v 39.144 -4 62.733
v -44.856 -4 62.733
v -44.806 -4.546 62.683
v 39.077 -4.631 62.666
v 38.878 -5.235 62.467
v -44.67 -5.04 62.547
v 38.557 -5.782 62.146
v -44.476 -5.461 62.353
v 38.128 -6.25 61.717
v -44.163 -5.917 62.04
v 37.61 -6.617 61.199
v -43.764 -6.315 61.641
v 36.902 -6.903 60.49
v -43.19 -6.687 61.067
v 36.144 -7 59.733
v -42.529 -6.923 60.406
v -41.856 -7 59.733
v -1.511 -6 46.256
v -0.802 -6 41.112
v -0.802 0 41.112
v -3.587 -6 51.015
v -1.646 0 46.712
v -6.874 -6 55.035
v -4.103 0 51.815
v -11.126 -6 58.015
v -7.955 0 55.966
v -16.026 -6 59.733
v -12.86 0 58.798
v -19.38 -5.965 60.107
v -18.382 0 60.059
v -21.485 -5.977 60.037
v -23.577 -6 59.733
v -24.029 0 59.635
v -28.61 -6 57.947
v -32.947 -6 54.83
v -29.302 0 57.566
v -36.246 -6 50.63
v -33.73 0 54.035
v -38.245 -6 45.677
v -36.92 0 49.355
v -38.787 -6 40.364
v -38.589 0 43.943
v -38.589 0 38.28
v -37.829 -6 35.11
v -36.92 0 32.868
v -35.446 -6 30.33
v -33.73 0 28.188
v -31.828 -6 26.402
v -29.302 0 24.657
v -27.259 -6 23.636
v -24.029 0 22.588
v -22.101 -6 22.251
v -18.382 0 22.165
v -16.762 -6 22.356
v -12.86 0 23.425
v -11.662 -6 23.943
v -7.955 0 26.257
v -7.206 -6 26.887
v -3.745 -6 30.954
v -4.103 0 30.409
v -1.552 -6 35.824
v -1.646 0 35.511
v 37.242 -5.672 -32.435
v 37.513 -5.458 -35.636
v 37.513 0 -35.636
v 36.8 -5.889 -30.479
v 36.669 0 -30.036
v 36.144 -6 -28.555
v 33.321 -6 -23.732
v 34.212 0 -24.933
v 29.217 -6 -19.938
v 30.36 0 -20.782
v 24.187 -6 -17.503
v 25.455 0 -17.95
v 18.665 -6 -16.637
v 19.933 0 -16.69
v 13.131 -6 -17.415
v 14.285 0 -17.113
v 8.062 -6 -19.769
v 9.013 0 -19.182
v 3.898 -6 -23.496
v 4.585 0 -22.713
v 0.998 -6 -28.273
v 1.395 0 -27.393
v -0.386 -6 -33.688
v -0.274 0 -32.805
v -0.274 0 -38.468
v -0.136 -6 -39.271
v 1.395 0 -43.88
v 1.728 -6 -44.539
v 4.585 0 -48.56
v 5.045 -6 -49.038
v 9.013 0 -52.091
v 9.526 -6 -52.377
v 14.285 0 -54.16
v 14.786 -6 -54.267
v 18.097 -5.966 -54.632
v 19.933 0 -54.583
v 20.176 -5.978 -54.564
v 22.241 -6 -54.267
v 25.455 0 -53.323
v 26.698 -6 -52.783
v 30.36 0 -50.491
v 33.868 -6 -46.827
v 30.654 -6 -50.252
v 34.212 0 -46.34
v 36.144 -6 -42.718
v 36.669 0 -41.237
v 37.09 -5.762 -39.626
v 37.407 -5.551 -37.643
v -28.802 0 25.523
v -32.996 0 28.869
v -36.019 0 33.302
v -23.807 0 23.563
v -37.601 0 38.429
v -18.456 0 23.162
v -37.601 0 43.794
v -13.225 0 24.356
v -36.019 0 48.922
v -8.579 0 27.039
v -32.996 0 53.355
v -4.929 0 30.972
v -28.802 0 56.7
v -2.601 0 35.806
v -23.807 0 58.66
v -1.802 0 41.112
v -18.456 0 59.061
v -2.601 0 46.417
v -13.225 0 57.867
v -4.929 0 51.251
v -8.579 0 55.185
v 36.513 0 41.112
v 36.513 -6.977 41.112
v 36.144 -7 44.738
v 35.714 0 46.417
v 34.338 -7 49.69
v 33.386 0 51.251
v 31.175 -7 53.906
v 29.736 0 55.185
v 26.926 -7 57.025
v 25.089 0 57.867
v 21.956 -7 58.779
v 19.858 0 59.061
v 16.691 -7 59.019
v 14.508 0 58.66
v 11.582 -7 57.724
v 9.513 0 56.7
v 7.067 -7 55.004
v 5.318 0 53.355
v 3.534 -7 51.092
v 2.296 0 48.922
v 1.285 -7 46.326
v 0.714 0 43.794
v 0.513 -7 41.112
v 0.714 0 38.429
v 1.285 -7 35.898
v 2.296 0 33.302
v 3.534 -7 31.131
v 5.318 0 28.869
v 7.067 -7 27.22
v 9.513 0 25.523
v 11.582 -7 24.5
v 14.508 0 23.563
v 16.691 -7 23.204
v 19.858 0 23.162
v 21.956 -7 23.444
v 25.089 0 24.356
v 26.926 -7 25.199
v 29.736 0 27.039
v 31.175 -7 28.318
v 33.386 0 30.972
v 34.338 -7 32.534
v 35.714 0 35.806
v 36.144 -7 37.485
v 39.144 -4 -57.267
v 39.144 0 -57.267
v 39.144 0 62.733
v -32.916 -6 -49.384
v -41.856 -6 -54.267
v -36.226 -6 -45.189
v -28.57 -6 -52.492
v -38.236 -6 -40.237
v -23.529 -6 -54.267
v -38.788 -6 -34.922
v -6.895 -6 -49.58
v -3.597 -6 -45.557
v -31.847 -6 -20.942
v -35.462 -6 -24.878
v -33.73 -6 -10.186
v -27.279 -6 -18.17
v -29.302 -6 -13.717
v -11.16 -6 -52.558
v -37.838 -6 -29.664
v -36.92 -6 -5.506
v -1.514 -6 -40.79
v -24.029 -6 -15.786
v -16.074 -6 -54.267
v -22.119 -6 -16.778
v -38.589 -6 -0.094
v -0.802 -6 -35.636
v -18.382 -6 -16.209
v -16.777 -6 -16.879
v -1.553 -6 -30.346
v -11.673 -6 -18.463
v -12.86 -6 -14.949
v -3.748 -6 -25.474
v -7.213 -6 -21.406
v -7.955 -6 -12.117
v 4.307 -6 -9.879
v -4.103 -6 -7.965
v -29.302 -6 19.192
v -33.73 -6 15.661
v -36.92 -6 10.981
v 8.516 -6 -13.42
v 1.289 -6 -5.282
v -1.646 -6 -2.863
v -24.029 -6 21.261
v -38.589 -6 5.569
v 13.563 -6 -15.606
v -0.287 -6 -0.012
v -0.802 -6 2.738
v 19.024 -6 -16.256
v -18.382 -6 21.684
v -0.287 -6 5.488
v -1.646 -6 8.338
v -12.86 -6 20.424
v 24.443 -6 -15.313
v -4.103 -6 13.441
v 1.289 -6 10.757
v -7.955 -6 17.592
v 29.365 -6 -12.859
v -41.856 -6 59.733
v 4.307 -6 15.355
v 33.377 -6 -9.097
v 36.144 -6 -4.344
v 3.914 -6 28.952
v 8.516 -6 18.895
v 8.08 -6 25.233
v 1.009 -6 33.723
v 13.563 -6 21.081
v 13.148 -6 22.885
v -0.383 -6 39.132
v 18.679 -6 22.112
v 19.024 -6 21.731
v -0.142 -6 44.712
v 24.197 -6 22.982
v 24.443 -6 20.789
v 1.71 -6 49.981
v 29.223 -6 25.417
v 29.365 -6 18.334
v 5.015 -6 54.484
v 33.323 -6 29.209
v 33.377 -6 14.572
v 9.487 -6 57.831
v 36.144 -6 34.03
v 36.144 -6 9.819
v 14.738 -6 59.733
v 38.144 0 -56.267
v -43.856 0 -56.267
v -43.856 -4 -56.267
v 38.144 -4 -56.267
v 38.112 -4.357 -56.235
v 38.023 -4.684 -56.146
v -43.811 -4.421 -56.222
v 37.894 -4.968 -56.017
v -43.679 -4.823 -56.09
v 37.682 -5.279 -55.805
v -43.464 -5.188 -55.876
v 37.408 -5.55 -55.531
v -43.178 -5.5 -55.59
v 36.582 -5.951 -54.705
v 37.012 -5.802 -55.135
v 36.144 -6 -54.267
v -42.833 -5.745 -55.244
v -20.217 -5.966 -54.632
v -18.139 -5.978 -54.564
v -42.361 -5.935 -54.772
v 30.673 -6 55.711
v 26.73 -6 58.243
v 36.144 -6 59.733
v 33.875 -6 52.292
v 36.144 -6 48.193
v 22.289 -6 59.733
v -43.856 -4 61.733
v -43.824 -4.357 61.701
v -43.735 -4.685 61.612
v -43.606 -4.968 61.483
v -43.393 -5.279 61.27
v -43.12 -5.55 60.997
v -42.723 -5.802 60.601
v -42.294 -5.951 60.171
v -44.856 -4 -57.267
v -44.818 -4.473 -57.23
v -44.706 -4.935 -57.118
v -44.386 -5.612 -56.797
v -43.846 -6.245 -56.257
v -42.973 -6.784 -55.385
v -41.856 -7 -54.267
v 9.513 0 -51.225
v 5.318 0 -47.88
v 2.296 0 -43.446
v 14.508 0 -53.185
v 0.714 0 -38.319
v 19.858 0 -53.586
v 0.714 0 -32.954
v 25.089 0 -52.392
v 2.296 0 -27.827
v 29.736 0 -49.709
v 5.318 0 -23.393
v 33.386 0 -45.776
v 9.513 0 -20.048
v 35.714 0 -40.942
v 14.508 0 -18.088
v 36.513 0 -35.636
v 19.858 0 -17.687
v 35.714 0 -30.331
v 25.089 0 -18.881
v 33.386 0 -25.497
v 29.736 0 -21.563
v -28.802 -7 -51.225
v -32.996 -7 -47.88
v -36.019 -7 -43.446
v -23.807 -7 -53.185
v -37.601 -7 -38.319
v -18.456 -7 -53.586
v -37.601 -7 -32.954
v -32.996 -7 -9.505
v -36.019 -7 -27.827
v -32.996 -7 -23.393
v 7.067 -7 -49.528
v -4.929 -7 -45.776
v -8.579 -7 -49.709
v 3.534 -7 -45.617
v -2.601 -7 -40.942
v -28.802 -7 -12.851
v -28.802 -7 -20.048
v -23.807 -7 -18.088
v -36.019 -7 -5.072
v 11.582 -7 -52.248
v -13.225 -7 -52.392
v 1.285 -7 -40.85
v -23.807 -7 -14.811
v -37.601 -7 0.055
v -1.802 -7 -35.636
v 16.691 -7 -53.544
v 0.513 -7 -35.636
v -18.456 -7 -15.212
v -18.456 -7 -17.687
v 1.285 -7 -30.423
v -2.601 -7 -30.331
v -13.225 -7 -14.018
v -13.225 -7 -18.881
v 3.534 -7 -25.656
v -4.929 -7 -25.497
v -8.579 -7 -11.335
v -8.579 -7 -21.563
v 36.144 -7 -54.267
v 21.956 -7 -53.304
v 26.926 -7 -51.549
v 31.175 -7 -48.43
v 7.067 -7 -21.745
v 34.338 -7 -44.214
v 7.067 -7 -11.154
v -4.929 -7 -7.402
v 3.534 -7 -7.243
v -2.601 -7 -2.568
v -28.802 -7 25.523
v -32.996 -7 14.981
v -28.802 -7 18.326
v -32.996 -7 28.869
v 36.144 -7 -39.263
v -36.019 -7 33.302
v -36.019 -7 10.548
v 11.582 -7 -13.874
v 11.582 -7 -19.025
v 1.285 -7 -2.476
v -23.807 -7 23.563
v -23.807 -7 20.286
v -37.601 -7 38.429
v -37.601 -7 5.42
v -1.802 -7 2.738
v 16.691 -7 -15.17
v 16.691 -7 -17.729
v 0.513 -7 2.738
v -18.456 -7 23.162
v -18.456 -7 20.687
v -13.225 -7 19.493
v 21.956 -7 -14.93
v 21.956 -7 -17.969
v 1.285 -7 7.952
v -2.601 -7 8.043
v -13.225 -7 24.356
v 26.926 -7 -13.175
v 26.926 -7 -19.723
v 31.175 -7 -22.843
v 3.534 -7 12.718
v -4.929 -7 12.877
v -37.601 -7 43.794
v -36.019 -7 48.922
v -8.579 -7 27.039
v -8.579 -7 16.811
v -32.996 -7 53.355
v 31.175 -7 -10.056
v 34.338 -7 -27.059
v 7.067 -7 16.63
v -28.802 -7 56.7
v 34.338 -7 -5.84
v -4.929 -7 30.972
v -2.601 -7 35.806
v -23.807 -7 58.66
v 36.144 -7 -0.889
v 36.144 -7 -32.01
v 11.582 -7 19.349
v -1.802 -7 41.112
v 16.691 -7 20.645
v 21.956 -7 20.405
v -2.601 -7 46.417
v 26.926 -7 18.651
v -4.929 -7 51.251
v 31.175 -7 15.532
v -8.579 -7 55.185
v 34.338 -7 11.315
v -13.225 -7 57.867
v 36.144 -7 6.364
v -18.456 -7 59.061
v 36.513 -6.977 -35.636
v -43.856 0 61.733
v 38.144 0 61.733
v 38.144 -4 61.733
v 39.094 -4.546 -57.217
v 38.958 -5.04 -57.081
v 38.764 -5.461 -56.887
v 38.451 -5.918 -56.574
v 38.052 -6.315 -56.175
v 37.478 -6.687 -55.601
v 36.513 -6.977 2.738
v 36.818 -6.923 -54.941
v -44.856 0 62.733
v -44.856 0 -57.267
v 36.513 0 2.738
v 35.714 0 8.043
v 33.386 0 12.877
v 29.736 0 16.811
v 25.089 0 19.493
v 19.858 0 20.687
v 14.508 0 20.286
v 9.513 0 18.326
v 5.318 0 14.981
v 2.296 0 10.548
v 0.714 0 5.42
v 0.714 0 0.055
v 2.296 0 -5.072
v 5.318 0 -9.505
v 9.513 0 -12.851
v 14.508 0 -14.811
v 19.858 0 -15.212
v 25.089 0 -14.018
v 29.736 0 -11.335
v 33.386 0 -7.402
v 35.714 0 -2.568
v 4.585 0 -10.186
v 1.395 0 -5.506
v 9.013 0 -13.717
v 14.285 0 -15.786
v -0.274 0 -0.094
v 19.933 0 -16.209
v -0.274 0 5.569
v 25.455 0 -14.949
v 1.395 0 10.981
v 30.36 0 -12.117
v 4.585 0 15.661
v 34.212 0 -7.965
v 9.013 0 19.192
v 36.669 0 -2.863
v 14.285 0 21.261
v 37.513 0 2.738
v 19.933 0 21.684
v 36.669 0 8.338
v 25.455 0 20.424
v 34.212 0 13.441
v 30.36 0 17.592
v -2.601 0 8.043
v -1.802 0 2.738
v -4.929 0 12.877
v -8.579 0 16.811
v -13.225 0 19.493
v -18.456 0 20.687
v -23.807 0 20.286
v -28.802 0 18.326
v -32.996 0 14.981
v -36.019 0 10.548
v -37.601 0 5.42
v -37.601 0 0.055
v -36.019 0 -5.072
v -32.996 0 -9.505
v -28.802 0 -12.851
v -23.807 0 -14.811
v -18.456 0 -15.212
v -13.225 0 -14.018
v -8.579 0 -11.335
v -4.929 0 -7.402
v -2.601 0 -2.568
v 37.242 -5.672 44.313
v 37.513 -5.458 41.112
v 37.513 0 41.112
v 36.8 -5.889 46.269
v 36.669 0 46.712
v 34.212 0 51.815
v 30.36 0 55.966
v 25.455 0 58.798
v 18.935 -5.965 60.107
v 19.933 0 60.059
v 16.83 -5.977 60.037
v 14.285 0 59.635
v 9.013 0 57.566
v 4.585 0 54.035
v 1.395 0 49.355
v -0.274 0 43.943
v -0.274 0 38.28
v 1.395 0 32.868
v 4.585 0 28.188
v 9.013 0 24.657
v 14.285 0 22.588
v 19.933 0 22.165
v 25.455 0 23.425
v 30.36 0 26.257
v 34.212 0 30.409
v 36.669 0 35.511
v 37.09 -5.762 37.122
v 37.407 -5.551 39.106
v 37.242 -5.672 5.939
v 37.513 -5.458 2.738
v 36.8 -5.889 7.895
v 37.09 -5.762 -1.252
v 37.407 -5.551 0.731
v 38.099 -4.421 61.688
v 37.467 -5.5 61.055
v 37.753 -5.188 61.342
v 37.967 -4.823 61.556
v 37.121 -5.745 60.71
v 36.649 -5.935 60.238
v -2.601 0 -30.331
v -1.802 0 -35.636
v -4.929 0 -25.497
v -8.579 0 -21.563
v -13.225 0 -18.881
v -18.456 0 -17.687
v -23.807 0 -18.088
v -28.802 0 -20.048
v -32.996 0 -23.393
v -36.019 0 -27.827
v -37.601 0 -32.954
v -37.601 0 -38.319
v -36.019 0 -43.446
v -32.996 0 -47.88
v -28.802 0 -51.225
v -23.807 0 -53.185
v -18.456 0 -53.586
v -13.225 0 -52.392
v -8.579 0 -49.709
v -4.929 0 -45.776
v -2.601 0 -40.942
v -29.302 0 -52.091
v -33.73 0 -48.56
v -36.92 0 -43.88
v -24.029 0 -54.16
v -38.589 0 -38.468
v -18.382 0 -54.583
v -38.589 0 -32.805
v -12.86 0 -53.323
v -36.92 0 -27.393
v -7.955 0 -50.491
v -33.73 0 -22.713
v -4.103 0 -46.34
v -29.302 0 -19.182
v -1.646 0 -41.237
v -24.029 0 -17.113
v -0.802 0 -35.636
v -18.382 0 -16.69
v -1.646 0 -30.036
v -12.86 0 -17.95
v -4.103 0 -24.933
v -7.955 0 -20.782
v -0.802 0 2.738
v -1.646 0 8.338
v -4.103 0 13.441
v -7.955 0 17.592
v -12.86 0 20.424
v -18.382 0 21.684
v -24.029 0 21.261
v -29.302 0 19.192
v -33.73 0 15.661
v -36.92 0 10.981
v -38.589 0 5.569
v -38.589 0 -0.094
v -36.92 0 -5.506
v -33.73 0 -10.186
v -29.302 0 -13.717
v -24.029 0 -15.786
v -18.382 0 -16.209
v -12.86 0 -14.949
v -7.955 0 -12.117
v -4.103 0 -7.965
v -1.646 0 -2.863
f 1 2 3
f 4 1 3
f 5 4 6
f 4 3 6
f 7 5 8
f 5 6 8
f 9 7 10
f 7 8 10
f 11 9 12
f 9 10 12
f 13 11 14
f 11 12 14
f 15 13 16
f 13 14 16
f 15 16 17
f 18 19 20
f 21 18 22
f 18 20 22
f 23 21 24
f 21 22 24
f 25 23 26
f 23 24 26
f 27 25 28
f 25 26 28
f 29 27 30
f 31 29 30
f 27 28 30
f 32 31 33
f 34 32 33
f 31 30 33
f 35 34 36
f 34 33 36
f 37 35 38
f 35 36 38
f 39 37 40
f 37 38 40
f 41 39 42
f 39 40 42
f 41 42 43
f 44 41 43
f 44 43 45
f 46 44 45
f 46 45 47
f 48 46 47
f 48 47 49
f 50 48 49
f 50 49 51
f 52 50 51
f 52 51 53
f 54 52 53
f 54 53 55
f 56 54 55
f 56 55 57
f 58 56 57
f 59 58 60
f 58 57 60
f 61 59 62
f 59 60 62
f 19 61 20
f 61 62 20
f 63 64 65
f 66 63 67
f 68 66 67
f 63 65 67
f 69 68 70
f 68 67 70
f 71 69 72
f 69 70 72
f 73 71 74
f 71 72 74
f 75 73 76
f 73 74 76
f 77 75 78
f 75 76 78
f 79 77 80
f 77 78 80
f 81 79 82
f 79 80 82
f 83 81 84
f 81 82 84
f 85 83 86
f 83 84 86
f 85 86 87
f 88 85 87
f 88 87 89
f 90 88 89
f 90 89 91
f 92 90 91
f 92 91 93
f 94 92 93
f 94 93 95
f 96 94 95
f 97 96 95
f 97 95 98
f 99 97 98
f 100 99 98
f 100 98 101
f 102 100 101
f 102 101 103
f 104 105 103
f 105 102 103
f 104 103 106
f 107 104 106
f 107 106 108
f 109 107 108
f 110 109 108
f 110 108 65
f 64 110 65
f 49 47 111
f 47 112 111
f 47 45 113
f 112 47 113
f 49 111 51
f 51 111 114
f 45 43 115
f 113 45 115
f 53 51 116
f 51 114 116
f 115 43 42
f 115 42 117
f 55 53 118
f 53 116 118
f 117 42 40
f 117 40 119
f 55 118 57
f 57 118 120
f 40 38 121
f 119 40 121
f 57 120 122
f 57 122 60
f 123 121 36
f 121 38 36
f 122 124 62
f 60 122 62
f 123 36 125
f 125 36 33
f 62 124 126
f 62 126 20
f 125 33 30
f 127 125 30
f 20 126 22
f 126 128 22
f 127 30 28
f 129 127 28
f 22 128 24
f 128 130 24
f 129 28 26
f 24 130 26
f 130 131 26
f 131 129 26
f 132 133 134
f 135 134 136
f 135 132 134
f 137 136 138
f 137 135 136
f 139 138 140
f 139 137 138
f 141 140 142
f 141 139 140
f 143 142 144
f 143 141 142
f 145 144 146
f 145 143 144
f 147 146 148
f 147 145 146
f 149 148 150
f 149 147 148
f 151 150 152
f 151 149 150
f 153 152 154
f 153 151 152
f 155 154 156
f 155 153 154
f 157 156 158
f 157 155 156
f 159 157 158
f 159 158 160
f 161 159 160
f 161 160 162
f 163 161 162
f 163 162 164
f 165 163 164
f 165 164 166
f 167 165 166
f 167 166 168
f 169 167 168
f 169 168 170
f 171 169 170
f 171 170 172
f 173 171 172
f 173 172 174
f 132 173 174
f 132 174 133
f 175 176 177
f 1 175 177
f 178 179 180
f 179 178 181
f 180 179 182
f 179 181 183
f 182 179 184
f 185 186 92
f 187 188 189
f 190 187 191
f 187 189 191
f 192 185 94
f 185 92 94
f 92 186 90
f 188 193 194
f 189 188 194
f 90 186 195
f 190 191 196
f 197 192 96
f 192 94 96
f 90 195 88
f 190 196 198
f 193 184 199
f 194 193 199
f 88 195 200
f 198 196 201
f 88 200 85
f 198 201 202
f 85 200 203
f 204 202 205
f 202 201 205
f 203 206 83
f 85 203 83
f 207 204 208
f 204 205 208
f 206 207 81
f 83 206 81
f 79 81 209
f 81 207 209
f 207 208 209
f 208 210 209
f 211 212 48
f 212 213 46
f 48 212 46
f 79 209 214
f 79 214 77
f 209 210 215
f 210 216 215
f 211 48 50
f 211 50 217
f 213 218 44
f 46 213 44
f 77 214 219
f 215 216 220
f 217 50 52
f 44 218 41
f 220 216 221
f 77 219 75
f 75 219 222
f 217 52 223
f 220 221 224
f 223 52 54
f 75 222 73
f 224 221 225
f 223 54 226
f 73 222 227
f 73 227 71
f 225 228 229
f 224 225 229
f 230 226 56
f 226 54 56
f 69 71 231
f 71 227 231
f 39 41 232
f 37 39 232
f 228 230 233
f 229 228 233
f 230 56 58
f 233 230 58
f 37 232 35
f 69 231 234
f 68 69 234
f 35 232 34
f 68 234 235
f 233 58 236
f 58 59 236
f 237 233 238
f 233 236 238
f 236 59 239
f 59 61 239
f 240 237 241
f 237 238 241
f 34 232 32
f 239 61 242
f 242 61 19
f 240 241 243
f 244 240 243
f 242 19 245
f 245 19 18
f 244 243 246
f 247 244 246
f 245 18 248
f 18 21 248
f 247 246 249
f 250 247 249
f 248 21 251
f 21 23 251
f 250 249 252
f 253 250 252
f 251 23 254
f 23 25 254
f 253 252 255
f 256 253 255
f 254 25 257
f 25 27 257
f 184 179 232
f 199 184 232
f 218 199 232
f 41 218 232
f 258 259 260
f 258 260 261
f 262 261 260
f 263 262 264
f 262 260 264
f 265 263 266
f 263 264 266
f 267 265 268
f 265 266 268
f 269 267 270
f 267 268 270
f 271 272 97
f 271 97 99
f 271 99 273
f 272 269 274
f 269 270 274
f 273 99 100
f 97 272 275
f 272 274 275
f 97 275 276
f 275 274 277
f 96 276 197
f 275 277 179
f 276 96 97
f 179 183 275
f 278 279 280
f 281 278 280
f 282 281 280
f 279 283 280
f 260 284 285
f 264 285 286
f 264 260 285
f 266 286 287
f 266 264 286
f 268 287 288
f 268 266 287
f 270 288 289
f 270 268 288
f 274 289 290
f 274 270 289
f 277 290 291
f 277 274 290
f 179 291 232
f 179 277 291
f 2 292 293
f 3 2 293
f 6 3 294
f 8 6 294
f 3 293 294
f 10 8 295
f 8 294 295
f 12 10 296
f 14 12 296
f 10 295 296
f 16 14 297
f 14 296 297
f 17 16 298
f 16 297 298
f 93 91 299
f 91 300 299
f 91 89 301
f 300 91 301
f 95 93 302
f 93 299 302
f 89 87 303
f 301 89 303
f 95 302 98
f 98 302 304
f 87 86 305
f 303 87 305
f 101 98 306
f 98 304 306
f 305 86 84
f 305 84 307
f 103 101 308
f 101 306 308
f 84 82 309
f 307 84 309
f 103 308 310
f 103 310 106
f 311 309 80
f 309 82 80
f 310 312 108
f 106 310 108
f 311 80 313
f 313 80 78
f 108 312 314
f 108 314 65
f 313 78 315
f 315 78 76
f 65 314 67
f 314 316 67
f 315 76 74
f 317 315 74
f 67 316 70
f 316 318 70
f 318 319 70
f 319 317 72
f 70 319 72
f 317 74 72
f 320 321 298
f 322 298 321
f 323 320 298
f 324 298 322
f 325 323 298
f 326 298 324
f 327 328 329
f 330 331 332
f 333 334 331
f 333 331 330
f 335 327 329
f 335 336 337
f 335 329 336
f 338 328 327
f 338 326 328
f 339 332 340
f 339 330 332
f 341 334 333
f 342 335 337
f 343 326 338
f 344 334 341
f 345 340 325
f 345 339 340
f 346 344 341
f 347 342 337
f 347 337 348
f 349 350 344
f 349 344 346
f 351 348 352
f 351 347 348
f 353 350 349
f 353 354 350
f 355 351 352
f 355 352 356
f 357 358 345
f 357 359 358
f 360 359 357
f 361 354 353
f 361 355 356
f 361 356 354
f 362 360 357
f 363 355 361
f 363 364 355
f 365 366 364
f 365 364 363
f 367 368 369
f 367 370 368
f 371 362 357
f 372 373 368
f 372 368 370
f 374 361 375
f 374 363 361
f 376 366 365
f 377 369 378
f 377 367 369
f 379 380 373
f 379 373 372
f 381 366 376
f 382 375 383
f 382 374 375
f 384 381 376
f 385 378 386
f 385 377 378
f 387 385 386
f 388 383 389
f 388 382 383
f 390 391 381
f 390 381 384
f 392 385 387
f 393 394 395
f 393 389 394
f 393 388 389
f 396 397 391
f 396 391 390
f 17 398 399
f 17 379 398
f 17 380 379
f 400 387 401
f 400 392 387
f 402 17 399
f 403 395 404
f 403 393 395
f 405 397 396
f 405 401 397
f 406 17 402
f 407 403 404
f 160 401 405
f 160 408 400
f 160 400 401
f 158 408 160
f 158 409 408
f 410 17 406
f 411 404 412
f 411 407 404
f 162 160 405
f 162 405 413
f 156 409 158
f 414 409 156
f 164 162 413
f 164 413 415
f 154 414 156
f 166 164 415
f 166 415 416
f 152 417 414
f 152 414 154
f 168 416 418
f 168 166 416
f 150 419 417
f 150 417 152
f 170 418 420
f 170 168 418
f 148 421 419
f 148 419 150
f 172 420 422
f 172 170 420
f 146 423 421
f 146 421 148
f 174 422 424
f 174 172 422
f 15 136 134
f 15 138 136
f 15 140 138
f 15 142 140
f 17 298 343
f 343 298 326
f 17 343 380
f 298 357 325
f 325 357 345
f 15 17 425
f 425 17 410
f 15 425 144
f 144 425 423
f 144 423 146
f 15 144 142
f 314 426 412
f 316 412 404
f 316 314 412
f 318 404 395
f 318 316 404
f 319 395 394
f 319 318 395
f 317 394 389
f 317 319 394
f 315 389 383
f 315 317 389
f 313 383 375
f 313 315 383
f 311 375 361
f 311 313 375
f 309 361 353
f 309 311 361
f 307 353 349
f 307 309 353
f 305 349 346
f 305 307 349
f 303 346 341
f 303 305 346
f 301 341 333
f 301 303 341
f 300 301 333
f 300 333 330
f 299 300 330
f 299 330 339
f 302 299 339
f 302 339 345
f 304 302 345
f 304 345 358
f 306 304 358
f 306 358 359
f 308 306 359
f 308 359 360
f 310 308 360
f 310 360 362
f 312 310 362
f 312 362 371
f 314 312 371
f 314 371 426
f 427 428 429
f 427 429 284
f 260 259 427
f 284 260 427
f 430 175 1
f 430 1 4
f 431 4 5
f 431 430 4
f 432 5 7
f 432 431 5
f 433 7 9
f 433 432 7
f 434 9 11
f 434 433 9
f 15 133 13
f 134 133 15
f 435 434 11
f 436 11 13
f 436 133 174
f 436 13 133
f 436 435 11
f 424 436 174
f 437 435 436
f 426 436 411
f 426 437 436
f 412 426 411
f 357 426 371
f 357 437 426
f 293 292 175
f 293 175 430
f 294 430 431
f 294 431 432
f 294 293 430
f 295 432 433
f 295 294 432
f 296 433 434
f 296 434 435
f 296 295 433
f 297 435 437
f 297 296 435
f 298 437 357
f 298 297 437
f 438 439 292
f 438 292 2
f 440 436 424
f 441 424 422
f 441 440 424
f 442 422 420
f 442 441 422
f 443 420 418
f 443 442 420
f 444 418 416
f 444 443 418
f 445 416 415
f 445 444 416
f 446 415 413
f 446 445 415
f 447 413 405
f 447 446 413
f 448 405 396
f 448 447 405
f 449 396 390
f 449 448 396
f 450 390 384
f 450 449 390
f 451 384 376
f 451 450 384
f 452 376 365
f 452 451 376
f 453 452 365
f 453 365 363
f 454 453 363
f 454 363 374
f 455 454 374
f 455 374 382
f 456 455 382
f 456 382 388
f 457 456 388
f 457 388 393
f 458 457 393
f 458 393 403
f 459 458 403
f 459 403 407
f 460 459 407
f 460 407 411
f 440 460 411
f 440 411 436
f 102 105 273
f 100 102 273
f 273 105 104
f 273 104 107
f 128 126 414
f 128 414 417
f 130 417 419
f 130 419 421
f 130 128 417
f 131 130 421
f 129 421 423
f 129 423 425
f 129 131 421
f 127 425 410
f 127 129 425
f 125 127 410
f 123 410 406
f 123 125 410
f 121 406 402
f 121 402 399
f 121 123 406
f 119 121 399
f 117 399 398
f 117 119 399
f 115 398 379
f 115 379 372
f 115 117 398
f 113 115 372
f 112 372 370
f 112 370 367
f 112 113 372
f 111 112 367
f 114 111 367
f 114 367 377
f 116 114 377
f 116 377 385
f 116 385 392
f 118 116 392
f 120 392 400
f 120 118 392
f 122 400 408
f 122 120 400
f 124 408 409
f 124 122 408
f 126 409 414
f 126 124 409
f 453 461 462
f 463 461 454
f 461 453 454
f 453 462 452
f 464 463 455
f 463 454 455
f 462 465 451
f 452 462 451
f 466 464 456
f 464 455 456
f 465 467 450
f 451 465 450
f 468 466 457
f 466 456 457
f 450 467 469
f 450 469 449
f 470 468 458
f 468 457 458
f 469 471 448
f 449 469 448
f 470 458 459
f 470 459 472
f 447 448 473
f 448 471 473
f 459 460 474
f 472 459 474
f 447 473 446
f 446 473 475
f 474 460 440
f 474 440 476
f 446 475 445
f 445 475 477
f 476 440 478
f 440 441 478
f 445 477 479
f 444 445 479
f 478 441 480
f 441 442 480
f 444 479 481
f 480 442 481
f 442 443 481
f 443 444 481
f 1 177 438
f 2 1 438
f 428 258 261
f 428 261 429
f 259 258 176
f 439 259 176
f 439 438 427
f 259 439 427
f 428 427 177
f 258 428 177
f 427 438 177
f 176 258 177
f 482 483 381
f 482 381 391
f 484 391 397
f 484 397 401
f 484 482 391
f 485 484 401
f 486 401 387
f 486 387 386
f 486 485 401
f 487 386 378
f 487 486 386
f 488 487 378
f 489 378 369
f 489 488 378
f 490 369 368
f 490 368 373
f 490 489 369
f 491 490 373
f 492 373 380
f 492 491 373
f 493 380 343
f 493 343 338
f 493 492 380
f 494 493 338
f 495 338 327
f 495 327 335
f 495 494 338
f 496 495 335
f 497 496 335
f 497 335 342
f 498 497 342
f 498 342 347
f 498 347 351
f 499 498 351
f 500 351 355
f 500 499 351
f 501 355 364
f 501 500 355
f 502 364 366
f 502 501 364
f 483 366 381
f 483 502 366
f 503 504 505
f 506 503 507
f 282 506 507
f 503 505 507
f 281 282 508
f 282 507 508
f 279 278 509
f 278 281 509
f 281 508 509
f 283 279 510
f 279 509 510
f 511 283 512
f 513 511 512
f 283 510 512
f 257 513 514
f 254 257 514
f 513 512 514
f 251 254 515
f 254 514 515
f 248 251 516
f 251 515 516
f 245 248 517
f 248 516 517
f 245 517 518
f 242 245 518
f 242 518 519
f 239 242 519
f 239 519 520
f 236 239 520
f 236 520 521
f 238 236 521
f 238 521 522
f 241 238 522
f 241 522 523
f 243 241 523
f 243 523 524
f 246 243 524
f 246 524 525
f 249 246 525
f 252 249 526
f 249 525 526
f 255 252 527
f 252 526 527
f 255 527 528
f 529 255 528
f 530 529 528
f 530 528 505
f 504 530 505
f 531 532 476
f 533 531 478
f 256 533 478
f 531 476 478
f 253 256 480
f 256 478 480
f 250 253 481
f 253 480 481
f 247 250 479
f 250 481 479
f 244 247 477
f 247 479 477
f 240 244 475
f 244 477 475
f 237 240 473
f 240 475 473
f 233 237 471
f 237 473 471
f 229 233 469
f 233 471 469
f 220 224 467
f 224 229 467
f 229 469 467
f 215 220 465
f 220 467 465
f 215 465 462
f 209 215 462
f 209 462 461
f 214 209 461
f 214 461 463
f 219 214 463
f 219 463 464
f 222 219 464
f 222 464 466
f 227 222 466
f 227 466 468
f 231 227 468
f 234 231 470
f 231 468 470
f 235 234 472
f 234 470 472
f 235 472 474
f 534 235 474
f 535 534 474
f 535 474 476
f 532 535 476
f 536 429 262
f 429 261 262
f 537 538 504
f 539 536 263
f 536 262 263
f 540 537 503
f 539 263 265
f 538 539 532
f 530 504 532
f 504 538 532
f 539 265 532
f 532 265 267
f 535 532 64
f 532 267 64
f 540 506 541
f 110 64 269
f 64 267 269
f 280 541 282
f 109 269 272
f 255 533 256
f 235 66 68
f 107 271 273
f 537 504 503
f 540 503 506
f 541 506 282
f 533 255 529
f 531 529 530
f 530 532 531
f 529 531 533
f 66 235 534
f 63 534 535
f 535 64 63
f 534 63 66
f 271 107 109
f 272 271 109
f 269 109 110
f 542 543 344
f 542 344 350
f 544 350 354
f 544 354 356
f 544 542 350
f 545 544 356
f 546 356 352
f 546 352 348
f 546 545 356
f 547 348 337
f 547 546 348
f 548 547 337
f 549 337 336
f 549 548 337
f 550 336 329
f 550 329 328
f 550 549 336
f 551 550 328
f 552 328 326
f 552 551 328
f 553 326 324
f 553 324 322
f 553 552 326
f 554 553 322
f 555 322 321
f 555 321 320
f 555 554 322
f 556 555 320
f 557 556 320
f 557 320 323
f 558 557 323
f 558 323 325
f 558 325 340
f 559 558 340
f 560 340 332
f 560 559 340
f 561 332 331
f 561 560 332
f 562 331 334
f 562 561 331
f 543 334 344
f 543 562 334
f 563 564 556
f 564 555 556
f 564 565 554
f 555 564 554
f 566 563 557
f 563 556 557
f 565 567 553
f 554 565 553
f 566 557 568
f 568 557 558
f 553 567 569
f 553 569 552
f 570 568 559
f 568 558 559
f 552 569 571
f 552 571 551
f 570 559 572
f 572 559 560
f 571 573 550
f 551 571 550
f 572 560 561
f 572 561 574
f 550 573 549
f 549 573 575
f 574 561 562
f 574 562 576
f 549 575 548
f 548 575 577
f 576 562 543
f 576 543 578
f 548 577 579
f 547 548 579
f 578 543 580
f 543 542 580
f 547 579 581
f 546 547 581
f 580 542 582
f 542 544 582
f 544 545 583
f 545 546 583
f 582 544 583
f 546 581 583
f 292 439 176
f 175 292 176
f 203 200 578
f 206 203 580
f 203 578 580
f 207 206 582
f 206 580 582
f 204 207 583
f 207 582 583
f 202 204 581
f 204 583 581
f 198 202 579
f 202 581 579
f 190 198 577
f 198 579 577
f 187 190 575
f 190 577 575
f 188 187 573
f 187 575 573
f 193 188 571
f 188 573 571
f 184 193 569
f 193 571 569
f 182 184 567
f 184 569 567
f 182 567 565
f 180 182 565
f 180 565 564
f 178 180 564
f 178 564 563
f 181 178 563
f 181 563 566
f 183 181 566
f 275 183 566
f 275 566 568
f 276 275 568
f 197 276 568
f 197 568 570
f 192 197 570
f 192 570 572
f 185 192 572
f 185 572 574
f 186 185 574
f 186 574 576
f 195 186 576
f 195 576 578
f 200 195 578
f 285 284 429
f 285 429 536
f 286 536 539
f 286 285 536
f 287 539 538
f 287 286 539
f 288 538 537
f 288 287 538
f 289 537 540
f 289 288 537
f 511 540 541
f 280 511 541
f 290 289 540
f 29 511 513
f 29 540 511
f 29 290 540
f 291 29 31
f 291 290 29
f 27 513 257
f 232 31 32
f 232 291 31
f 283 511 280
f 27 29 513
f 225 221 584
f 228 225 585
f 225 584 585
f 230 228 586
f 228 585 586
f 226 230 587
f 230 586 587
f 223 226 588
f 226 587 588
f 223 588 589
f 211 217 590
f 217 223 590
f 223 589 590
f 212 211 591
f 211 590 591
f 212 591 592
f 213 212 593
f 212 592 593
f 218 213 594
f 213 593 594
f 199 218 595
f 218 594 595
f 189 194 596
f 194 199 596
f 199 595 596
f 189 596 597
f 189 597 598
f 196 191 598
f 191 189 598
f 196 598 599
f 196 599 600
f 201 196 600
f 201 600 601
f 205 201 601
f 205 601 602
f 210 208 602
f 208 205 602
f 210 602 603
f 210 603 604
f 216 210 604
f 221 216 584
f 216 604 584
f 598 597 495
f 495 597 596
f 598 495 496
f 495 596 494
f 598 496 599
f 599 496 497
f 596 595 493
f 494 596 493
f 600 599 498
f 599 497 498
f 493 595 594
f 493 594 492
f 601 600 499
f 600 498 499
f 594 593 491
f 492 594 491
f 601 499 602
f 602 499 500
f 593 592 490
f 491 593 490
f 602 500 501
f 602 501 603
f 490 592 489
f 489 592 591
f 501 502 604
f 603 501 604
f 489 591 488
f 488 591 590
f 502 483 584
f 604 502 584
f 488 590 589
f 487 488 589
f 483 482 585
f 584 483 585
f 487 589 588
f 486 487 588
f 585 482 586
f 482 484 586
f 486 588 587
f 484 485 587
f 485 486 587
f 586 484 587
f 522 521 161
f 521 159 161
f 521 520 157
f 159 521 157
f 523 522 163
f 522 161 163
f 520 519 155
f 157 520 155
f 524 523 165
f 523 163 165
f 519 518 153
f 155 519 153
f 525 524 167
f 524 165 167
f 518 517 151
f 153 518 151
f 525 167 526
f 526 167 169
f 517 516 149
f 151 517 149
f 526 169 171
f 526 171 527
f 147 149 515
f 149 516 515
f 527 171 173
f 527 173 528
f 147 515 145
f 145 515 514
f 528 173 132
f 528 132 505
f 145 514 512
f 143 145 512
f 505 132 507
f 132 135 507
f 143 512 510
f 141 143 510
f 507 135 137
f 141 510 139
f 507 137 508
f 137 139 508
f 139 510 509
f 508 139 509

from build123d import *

# Parameters (mm, degrees)
F0_W        = 4
F0_H        = 120
F0_R        = 18
F1_DEPTH    = 7
F2_T1_DEPTH = 135
F2_T3_DEPTH = 99
F3_T        = -1


# Not quite as in the source:
# - a fillet or chamfer that OpenCascade refuses, or shapes differently, is made with other operations: its cross-section is extruded or revolved along the edge and cut away or added


with BuildPart() as f1:
    # F0 (on Front) → F1 (new body)
    with BuildSketch(Plane.XZ):
        with Locations((-42.8557436466, 2.7328292441)):
            Rectangle(F0_W, F0_H)
        Polygon((-0.6441245232, 2.7376232945), (-0.6441245232, 62.7328292441), (-40.8557436466, 62.7328292441), (-40.8557436466, -57.2671707559), (-0.6441245232, -57.2671707559), align=None)
        with Locations((-19.8015584055, -35.636439333)):
            Circle(F0_R, mode=Mode.SUBTRACT)
        with Locations((-19.8015584055, 2.7376232945)):
            Circle(F0_R, mode=Mode.SUBTRACT)
        with Locations((-19.8015584055, 41.1116859221)):
            Circle(F0_R, mode=Mode.SUBTRACT)
        Polygon((39.1442563534, -57.2671707559), (39.1442563534, 62.7328292441), (-0.6441245232, 62.7328292441), (-0.6441245232, 2.7376232945), (-0.6441245232, -57.2671707559), align=None)
        with Locations((18.5133093592, -35.636439333)):
            Circle(F0_R, mode=Mode.SUBTRACT)
        with Locations((18.5133093592, 2.7376232945)):
            Circle(F0_R, mode=Mode.SUBTRACT)
        with Locations((18.5133093592, 41.1116859221)):
            Circle(F0_R, mode=Mode.SUBTRACT)
    extrude(amount=F1_DEPTH)

    # F2: fillet of radius 3 on 4 edges, made by hand

    # F2_s2 → F2_t1 (cut)
    with BuildSketch(Plane.XY.offset(-64.7671707559)):
        with BuildLine():
            ThreePointArc((-44.8557436466, -4), (-43.9770639902, -6.1213203436), (-41.8557436466, -7))
            Line((-41.8557436466, -7), (-44.8557436466, -7))
            Line((-44.8557436466, -7), (-44.8557436466, -4))
        make_face()
        with BuildLine():
            ThreePointArc((39.1442563534, -4), (38.2655766969, -6.1213203436), (36.1442563534, -7))
            Line((36.1442563534, -7), (39.1442563534, -7))
            Line((39.1442563534, -7), (39.1442563534, -4))
        make_face()
    extrude(amount=F2_T1_DEPTH, mode=Mode.SUBTRACT)

    # F2_s4 → F2_t3 (cut)
    with BuildSketch(Plane.YZ.offset(-52.3557436466)):
        with BuildLine():
            ThreePointArc((-4, -57.2671707559), (-6.1213203436, -56.3884910995), (-7, -54.2671707559))
            Line((-7, -54.2671707559), (-7, -57.2671707559))
            Line((-7, -57.2671707559), (-4, -57.2671707559))
        make_face()
        with BuildLine():
            ThreePointArc((-4, 62.7328292441), (-6.1213203436, 61.8541495876), (-7, 59.7328292441))
            Line((-7, 59.7328292441), (-7, 62.7328292441))
            Line((-7, 62.7328292441), (-4, 62.7328292441))
        make_face()
    extrude(amount=F2_T3_DEPTH, mode=Mode.SUBTRACT)

    # F3
    f3_openings = [f1.faces().sort_by_distance(p)[0] for p in [
        (-43.390957, 0, 2.732829),
    ]]
    offset(amount=F3_T, openings=f3_openings)


solid = f1.part
